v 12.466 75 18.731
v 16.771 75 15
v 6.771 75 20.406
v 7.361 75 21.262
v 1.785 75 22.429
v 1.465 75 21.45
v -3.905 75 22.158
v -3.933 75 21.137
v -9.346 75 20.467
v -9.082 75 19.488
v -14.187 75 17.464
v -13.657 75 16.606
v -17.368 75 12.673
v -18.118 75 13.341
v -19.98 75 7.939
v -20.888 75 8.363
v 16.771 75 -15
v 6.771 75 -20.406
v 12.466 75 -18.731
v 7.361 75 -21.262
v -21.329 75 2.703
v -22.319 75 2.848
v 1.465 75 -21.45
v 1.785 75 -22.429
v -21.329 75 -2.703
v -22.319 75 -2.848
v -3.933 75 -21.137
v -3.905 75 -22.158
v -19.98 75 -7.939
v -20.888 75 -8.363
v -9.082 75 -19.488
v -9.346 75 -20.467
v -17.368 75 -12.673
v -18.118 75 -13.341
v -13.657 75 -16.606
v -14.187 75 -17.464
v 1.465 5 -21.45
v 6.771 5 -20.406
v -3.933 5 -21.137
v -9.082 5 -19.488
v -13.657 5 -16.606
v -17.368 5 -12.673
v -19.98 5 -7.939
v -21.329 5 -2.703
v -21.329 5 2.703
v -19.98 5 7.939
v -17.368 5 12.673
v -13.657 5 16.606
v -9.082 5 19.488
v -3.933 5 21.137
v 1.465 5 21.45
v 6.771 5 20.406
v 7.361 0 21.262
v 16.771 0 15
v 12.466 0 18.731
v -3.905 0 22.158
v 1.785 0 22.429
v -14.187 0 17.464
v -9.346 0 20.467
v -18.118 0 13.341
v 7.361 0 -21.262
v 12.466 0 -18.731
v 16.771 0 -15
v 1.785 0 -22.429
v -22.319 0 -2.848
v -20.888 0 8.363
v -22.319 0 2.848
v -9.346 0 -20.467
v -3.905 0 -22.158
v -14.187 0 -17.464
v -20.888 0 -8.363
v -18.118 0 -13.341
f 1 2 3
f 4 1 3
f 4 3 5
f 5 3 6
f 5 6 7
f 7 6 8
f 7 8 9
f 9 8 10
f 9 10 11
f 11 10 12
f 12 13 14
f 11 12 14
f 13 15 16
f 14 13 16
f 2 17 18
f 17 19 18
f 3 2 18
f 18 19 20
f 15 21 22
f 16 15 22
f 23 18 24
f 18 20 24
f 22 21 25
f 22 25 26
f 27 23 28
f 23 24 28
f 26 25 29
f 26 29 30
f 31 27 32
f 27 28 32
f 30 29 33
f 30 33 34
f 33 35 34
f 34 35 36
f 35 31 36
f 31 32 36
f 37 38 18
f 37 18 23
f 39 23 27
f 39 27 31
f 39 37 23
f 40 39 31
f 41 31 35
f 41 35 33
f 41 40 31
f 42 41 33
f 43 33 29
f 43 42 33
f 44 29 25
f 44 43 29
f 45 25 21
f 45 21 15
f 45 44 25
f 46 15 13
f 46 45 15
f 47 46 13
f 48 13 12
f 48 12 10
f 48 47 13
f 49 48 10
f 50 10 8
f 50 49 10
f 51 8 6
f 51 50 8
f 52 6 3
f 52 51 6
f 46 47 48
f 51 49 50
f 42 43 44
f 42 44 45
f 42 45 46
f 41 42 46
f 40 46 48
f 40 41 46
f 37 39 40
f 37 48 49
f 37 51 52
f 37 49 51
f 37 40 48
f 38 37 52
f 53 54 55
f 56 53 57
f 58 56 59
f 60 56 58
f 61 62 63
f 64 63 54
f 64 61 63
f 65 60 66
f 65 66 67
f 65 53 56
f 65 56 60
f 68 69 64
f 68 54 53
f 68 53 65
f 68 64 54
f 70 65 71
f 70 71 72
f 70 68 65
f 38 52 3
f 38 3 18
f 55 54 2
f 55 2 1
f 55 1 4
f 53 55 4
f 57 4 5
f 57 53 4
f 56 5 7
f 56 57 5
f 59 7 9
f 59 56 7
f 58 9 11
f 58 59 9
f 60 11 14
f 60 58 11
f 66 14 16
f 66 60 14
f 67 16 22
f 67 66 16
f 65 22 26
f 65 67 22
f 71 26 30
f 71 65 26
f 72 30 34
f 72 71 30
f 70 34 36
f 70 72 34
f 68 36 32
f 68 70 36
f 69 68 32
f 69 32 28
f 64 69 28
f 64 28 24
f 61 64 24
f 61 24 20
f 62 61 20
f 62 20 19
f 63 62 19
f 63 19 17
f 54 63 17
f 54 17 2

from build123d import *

# Parameters (mm, degrees)
BOSS_EXTRUDE1_DEPTH = 75
SHELL4_START        = 5
SHELL4_DEPTH        = 70


# Read off the part's stored shape, not the designer's step: Shell4
with BuildPart() as part:
    # Sketch1 → Boss-Extrude1 (new body)
    with BuildSketch(Plane(origin=(0, 0, 0), x_dir=(1, 0, 0), z_dir=(0, 1, 0))):
        with BuildLine():
            Line((16.770509831, 15), (16.770509831, -15))
            ThreePointArc((16.770509831, -15), (-22.5, 0), (16.770509831, 15))
        make_face()
    extrude(amount=BOSS_EXTRUDE1_DEPTH)

    # Shell4 outline → Shell4 (cut)
    with BuildSketch(Plane(origin=(0, 0, 0), x_dir=(1, 0, 0), z_dir=(0, 1, 0)).offset(SHELL4_START)):
        with BuildLine():
            ThreePointArc((6.770509831, 20.406131349), (-21.5, 0), (6.770509831, -20.406131349))
            Line((6.770509831, -20.406131349), (6.770509831, 20.406131349))
        make_face()
    extrude(amount=SHELL4_DEPTH, mode=Mode.SUBTRACT)


solid = part.part
